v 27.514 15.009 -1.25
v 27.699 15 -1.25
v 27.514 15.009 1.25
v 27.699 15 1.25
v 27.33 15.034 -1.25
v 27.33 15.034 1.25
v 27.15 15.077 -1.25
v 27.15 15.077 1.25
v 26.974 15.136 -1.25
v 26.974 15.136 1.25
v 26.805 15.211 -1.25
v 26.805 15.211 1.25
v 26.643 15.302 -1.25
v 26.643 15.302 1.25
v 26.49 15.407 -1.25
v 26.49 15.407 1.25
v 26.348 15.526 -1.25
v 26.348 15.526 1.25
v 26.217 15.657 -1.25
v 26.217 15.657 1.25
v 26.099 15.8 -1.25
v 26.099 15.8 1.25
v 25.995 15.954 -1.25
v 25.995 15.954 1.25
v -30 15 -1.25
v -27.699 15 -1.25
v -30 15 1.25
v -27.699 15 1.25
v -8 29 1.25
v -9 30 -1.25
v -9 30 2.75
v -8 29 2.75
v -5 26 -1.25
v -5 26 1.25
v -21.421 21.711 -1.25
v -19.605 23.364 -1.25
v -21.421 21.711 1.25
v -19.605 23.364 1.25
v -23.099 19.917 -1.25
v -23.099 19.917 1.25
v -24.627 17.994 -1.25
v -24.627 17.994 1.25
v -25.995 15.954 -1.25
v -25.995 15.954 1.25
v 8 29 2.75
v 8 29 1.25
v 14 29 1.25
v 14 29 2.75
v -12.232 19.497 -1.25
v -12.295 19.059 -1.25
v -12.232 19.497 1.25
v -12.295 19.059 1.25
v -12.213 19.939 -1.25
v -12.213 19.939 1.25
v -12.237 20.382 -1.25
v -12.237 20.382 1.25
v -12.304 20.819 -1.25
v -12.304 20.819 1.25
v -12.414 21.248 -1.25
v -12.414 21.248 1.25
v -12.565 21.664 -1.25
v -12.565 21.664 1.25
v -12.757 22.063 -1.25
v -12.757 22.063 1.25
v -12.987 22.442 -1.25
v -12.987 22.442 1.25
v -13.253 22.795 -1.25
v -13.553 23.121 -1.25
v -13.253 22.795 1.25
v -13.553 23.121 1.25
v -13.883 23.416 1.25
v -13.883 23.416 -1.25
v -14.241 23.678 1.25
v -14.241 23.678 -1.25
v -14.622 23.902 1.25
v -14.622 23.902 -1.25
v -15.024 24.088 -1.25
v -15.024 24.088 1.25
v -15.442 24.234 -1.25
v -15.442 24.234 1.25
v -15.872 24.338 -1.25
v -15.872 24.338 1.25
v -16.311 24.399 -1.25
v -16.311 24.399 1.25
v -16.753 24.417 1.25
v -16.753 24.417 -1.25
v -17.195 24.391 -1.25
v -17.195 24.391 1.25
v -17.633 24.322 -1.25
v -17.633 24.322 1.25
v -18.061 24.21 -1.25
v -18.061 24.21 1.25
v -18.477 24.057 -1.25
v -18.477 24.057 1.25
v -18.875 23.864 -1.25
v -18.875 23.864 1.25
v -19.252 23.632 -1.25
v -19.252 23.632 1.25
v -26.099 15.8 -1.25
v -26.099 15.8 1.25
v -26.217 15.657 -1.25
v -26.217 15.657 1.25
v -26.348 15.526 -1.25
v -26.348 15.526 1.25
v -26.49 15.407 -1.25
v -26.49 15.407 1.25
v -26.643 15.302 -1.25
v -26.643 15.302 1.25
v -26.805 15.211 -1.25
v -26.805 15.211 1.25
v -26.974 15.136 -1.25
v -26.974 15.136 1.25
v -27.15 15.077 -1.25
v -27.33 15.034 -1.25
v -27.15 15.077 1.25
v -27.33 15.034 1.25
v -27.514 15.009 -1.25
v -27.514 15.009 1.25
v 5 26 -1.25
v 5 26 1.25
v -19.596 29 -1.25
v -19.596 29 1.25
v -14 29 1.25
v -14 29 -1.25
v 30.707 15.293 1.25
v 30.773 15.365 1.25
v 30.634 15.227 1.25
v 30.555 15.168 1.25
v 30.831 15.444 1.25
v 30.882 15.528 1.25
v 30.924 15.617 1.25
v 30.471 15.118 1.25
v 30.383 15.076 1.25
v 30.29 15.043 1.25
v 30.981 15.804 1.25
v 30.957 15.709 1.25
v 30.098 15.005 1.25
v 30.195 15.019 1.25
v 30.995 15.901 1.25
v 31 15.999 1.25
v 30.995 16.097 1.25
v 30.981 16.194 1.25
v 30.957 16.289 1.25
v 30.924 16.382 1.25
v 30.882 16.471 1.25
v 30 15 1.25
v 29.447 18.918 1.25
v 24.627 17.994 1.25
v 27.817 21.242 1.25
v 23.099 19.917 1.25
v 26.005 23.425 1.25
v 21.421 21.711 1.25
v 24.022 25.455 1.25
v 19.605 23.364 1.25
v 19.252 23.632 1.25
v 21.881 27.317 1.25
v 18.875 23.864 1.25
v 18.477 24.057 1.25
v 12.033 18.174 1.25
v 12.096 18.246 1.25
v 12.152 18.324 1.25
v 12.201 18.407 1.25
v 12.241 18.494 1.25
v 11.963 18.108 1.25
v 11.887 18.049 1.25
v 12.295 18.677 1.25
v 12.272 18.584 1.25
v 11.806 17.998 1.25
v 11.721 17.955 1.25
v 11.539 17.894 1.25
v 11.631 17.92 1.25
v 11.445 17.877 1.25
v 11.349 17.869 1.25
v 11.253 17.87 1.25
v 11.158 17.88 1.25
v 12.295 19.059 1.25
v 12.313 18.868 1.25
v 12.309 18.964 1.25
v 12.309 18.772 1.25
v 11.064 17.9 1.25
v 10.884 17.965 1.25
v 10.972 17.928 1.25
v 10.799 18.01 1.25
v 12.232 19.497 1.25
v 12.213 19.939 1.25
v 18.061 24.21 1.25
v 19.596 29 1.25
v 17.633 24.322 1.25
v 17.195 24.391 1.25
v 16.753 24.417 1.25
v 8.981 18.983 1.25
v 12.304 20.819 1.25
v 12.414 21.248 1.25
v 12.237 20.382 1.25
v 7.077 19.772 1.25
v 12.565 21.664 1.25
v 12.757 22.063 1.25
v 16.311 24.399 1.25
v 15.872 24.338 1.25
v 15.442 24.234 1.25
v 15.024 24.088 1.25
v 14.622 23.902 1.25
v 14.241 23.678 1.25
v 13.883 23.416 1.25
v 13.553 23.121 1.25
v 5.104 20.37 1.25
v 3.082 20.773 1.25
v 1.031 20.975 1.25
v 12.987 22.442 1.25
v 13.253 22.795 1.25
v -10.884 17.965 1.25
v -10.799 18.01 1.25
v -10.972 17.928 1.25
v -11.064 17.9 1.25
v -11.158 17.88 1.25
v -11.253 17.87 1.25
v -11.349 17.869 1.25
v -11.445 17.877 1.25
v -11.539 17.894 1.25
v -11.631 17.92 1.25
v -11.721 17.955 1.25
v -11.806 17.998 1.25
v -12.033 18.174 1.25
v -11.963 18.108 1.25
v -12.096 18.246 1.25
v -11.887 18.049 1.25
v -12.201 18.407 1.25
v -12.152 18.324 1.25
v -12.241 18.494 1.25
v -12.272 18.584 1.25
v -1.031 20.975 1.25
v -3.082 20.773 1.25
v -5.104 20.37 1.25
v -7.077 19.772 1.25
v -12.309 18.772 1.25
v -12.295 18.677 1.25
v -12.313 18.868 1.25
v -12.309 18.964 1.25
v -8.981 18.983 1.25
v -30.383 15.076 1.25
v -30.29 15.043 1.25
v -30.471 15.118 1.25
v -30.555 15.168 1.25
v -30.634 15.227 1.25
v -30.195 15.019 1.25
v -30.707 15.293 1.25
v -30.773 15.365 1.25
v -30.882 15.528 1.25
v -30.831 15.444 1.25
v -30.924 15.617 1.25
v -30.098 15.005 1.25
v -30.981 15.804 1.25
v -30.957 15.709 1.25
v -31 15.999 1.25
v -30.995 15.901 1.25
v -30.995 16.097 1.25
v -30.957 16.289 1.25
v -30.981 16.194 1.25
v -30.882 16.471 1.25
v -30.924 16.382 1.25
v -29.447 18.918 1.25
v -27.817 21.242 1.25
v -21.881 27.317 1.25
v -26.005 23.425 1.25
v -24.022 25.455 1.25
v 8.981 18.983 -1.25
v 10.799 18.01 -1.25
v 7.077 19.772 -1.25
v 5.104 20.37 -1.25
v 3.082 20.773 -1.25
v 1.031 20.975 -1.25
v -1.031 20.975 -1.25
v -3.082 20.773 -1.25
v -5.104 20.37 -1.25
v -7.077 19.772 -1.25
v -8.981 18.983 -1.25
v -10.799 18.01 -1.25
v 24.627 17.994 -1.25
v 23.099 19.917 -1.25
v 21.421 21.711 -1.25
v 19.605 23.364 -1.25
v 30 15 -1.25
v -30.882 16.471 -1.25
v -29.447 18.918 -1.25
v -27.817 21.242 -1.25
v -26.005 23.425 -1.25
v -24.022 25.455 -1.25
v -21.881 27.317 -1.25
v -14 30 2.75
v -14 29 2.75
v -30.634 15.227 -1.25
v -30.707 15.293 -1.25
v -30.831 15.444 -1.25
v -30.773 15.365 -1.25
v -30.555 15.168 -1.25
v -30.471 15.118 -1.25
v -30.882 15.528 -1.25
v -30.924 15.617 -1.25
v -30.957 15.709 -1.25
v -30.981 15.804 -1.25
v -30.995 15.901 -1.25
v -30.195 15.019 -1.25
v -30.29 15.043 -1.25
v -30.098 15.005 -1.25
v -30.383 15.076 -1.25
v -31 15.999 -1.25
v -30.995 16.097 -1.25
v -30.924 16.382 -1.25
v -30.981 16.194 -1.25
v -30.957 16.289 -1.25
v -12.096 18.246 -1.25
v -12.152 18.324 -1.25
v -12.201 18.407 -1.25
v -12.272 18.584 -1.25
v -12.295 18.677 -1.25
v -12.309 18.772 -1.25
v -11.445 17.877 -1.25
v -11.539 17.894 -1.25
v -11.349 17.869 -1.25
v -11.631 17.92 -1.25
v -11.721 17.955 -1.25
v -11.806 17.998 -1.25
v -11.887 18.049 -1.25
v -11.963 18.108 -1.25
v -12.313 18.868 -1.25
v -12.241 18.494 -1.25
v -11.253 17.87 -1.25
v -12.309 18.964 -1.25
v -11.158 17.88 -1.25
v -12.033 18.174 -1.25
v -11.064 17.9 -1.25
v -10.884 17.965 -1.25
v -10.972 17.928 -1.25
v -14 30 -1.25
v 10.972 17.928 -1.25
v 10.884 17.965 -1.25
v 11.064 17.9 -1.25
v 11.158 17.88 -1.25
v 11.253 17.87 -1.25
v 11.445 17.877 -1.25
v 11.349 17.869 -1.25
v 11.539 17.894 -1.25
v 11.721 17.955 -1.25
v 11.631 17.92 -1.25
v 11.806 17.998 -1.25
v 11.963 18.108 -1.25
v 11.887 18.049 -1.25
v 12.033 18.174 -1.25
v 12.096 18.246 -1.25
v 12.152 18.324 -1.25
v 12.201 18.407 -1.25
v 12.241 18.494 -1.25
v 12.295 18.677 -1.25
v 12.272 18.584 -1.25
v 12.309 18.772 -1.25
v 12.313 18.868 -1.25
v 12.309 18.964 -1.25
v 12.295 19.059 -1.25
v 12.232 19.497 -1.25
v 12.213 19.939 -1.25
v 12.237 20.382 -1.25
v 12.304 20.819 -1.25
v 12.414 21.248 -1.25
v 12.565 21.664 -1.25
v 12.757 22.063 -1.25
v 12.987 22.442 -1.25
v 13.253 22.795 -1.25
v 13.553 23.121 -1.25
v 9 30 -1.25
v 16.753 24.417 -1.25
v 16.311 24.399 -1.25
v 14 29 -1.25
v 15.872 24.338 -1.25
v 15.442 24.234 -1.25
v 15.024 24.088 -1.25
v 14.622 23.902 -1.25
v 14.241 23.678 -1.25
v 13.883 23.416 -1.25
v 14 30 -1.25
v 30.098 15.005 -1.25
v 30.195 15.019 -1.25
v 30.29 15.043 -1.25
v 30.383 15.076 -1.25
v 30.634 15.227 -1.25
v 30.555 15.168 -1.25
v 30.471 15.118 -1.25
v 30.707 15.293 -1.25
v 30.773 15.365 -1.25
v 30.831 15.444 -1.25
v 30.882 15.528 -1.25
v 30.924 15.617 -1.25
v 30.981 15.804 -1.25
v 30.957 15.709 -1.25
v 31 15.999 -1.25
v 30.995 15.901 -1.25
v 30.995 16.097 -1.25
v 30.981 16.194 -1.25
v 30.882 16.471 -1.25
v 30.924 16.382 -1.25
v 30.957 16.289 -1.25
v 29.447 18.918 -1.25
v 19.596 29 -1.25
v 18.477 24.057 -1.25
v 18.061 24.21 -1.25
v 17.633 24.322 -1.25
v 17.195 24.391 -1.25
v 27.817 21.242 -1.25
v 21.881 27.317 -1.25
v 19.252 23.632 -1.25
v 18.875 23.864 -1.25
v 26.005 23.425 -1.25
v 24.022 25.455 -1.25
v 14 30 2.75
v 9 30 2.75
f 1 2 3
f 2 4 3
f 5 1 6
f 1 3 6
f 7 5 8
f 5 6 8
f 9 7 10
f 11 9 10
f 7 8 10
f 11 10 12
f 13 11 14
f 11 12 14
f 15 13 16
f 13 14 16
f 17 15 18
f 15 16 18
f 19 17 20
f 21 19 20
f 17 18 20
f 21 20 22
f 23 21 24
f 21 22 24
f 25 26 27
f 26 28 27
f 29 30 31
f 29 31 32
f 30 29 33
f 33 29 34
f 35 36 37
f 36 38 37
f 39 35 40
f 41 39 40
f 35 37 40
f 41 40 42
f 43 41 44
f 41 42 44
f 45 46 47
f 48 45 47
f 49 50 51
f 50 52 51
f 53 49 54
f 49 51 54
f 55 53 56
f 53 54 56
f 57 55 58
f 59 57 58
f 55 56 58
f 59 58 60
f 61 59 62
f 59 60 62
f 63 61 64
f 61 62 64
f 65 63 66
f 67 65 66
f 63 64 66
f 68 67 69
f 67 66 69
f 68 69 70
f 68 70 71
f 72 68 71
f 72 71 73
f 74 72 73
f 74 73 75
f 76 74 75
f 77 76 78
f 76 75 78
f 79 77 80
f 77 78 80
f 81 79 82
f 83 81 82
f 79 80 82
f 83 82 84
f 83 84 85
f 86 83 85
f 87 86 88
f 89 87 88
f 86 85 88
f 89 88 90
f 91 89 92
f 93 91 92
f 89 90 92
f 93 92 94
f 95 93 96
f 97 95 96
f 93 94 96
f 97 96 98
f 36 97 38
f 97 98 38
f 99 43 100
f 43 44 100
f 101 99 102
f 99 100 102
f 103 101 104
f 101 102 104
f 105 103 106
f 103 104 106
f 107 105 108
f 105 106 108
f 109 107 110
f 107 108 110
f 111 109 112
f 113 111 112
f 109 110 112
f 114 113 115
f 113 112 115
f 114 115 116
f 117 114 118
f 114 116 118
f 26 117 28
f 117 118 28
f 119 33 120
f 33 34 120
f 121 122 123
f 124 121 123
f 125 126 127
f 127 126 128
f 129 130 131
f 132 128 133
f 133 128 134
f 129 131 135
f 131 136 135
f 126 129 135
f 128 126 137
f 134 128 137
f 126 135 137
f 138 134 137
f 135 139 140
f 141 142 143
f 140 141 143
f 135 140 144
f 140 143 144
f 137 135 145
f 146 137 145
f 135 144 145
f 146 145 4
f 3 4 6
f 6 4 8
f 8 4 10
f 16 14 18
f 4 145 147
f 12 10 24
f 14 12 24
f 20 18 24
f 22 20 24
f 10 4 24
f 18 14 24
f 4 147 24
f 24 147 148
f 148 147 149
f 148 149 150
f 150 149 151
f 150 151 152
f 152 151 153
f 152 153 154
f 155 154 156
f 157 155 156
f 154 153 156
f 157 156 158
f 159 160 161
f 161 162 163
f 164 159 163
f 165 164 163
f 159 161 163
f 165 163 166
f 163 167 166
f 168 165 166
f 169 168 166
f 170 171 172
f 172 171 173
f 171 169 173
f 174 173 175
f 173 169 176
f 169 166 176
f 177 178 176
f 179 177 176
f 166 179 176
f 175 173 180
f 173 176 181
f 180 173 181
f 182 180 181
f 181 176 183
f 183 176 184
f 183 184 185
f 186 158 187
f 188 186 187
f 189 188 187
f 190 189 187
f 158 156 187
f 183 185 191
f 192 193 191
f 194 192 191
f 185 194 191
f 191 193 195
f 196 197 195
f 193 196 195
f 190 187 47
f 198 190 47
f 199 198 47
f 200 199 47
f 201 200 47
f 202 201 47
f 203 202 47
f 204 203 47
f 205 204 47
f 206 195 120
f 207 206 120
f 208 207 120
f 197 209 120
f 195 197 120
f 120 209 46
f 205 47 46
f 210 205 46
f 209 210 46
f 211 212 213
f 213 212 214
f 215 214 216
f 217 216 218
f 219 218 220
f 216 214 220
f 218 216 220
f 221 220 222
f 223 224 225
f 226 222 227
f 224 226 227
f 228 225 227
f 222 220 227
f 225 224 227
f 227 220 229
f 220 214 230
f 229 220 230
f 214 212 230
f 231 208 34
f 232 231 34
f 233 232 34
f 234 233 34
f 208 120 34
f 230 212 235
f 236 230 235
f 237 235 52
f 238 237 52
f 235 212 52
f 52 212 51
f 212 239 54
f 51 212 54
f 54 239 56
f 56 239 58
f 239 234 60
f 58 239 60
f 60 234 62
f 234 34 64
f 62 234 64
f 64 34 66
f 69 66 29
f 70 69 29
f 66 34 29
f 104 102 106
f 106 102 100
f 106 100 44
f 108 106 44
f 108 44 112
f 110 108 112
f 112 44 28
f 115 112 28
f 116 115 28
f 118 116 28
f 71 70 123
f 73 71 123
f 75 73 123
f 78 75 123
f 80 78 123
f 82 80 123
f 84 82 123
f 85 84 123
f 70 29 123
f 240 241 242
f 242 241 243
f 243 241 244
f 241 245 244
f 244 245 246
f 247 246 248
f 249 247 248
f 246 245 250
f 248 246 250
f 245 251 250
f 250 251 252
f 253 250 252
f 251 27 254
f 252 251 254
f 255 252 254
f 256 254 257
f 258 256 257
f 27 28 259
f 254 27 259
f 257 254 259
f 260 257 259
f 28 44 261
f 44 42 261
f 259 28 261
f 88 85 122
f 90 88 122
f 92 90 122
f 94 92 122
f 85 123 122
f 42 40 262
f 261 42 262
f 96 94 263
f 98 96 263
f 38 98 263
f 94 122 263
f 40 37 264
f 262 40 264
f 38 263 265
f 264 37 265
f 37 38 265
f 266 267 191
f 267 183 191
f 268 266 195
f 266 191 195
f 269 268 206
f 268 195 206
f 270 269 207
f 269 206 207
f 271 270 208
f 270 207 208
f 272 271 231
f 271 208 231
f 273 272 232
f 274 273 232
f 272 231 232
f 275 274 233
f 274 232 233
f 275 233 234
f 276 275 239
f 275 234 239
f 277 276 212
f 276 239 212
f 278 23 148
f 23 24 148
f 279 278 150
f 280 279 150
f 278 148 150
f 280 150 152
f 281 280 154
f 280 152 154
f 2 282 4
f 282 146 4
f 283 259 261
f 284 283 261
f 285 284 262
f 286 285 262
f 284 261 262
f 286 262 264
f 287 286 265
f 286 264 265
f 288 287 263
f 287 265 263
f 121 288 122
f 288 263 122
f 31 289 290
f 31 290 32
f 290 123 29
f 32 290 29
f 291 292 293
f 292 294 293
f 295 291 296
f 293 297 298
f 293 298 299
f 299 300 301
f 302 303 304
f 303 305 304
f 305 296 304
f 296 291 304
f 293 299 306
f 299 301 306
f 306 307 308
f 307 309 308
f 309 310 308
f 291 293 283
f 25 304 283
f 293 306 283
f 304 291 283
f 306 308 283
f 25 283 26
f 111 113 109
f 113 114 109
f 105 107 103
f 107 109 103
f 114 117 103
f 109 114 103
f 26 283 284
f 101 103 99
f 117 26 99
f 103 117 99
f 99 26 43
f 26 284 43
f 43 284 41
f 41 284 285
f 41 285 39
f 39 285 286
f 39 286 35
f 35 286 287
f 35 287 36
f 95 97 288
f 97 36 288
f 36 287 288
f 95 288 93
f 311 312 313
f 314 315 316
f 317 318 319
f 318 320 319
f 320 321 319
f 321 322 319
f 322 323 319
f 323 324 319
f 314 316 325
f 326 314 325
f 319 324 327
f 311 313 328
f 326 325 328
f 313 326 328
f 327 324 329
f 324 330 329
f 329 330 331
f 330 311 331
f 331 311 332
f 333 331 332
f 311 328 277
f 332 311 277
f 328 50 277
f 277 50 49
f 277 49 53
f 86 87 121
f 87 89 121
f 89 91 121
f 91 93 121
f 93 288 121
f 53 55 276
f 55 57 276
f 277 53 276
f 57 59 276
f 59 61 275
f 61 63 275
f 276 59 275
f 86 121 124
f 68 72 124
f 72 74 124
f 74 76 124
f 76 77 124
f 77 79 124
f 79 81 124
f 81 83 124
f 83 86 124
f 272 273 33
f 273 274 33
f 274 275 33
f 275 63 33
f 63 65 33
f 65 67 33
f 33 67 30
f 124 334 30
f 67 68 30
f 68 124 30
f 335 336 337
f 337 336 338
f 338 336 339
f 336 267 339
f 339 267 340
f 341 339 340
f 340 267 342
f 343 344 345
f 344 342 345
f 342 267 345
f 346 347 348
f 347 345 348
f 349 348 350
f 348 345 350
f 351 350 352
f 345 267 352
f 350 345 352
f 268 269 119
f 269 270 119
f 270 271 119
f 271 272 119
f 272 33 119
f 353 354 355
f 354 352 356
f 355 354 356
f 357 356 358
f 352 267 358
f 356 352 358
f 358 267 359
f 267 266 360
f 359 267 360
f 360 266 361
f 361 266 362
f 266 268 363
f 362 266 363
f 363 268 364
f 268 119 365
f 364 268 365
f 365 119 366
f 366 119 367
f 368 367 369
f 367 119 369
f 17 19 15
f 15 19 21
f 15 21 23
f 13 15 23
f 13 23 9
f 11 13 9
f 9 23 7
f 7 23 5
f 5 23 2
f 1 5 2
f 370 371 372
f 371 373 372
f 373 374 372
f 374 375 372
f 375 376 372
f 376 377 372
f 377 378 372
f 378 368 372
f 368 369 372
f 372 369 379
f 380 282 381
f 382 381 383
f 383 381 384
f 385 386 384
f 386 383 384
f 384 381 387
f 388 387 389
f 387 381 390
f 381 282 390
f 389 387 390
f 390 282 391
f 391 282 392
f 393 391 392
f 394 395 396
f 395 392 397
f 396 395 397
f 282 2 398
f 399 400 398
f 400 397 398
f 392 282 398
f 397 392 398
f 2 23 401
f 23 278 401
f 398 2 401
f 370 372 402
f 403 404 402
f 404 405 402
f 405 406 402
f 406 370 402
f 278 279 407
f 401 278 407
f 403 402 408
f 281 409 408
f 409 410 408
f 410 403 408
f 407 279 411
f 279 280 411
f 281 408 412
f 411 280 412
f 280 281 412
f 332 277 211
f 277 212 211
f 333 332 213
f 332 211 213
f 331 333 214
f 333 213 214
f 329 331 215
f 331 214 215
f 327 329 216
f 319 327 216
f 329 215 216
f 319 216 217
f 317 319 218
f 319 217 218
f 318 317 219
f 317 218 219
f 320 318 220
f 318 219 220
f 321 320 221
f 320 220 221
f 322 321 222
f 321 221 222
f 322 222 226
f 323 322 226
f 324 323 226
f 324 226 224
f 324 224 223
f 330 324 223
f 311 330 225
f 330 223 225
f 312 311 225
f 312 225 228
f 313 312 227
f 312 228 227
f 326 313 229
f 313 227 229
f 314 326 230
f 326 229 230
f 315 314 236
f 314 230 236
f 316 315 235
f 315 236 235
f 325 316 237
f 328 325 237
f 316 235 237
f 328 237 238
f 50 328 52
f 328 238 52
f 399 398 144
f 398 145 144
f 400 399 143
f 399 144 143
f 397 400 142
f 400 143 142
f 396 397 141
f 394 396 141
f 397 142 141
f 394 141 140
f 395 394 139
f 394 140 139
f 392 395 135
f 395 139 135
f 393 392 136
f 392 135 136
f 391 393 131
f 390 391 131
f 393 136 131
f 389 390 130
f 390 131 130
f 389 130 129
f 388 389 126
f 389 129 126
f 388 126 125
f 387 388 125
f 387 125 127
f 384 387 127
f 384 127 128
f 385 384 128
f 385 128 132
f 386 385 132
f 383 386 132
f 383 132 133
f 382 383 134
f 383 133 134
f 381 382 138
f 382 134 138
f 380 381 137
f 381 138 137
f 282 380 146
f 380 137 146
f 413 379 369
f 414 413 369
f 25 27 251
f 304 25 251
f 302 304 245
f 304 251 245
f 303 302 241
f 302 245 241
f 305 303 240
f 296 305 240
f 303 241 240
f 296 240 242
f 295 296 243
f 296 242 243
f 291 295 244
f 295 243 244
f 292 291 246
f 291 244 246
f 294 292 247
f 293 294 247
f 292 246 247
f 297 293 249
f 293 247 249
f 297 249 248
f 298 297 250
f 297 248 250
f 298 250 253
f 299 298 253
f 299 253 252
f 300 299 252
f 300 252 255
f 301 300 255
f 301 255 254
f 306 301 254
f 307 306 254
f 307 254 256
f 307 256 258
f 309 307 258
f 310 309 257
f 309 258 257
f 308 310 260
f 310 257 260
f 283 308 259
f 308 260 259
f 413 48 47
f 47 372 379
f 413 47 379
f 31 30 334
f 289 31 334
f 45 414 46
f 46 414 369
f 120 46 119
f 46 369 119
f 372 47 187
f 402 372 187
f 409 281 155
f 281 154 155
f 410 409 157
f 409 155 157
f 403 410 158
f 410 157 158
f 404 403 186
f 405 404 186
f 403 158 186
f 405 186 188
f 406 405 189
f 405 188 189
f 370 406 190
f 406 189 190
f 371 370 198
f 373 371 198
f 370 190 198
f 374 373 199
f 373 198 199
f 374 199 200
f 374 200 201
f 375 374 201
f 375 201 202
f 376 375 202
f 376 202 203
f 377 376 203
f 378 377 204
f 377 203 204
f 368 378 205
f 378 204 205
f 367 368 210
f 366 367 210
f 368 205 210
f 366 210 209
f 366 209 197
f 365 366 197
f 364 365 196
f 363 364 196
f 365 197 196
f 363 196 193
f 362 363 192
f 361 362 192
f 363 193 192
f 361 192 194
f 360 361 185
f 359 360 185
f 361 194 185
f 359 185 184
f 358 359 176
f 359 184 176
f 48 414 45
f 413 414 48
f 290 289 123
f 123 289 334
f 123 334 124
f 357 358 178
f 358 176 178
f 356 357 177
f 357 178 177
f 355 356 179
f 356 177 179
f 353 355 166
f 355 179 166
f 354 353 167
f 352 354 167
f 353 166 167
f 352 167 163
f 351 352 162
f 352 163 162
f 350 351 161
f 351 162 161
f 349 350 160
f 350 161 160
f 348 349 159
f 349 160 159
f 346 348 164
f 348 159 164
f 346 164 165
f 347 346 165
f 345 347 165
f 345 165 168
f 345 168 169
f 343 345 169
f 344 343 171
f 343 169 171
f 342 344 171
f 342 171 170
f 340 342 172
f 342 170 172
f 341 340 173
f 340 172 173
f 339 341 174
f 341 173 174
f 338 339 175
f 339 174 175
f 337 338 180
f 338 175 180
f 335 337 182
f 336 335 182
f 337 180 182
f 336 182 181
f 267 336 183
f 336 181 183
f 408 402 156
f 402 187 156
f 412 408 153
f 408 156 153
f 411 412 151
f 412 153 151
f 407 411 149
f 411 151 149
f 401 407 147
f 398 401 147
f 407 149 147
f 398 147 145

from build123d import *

# Parameters (mm, degrees)
EXTRUSION1_DEPTH = 1.25
EXTRUSION2_DEPTH = 4


with BuildPart() as part:
    # Esquisse1 → Extrusion1 (new, symmetric)
    with BuildSketch(Plane.XY):
        with BuildLine():
            Line((-19.595917942, 29), (-8, 29))
            Line((-8, 29), (-5, 26))
            Line((-5, 26), (5, 26))
            Line((5, 26), (8, 29))
            Line((8, 29), (19.595917942, 29))
            ThreePointArc((19.595917942, 29), (26.005009087, 23.425189484), (30.882352941, 16.470588235))
            ThreePointArc((30.882352941, 16.470588235), (30.857492926, 15.485504245), (30, 15))
            Line((30, 15), (27.699277969, 15))
            ThreePointArc((27.699277969, 15), (26.722627492, 15.254676578), (25.994707017, 15.953846154))
            ThreePointArc((25.994707017, 15.953846154), (23.098976948, 19.917009413), (19.605022095, 23.364355515))
            ThreePointArc((19.605022095, 23.364355515), (14.428703263, 23.794573944), (12.29508997, 19.058852366))
            ThreePointArc((12.29508997, 19.058852366), (11.88737091, 18.049208847), (10.799200573, 18.01047659))
            ThreePointArc((10.799200573, 18.01047659), (0, 21), (-10.799200573, 18.01047659))
            ThreePointArc((-10.799200573, 18.01047659), (-11.88737091, 18.049208847), (-12.29508997, 19.058852366))
            ThreePointArc((-12.29508997, 19.058852366), (-14.428703263, 23.794573944), (-19.605022095, 23.364355515))
            ThreePointArc((-19.605022095, 23.364355515), (-23.098976948, 19.917009413), (-25.994707017, 15.953846154))
            ThreePointArc((-25.994707017, 15.953846154), (-26.722627492, 15.254676578), (-27.699277969, 15))
            Line((-27.699277969, 15), (-30, 15))
            ThreePointArc((-30, 15), (-30.857492926, 15.485504245), (-30.882352941, 16.470588235))
            ThreePointArc((-30.882352941, 16.470588235), (-26.005009087, 23.425189484), (-19.595917942, 29))
        make_face()
    extrude(amount=EXTRUSION1_DEPTH, both=True)

    # Esquisse2 → Extrusion2 (add)
    with BuildSketch(Plane(origin=(0, 0, -1.25), x_dir=(-1, 0, 0), z_dir=(0, 0, -1))):
        Polygon((-8, 29), (-14, 29), (-14, 30), (-9, 30), align=None)
        Polygon((8, 29), (9, 30), (14, 30), (14, 29), align=None)
    extrude(amount=-EXTRUSION2_DEPTH)


solid = part.part
